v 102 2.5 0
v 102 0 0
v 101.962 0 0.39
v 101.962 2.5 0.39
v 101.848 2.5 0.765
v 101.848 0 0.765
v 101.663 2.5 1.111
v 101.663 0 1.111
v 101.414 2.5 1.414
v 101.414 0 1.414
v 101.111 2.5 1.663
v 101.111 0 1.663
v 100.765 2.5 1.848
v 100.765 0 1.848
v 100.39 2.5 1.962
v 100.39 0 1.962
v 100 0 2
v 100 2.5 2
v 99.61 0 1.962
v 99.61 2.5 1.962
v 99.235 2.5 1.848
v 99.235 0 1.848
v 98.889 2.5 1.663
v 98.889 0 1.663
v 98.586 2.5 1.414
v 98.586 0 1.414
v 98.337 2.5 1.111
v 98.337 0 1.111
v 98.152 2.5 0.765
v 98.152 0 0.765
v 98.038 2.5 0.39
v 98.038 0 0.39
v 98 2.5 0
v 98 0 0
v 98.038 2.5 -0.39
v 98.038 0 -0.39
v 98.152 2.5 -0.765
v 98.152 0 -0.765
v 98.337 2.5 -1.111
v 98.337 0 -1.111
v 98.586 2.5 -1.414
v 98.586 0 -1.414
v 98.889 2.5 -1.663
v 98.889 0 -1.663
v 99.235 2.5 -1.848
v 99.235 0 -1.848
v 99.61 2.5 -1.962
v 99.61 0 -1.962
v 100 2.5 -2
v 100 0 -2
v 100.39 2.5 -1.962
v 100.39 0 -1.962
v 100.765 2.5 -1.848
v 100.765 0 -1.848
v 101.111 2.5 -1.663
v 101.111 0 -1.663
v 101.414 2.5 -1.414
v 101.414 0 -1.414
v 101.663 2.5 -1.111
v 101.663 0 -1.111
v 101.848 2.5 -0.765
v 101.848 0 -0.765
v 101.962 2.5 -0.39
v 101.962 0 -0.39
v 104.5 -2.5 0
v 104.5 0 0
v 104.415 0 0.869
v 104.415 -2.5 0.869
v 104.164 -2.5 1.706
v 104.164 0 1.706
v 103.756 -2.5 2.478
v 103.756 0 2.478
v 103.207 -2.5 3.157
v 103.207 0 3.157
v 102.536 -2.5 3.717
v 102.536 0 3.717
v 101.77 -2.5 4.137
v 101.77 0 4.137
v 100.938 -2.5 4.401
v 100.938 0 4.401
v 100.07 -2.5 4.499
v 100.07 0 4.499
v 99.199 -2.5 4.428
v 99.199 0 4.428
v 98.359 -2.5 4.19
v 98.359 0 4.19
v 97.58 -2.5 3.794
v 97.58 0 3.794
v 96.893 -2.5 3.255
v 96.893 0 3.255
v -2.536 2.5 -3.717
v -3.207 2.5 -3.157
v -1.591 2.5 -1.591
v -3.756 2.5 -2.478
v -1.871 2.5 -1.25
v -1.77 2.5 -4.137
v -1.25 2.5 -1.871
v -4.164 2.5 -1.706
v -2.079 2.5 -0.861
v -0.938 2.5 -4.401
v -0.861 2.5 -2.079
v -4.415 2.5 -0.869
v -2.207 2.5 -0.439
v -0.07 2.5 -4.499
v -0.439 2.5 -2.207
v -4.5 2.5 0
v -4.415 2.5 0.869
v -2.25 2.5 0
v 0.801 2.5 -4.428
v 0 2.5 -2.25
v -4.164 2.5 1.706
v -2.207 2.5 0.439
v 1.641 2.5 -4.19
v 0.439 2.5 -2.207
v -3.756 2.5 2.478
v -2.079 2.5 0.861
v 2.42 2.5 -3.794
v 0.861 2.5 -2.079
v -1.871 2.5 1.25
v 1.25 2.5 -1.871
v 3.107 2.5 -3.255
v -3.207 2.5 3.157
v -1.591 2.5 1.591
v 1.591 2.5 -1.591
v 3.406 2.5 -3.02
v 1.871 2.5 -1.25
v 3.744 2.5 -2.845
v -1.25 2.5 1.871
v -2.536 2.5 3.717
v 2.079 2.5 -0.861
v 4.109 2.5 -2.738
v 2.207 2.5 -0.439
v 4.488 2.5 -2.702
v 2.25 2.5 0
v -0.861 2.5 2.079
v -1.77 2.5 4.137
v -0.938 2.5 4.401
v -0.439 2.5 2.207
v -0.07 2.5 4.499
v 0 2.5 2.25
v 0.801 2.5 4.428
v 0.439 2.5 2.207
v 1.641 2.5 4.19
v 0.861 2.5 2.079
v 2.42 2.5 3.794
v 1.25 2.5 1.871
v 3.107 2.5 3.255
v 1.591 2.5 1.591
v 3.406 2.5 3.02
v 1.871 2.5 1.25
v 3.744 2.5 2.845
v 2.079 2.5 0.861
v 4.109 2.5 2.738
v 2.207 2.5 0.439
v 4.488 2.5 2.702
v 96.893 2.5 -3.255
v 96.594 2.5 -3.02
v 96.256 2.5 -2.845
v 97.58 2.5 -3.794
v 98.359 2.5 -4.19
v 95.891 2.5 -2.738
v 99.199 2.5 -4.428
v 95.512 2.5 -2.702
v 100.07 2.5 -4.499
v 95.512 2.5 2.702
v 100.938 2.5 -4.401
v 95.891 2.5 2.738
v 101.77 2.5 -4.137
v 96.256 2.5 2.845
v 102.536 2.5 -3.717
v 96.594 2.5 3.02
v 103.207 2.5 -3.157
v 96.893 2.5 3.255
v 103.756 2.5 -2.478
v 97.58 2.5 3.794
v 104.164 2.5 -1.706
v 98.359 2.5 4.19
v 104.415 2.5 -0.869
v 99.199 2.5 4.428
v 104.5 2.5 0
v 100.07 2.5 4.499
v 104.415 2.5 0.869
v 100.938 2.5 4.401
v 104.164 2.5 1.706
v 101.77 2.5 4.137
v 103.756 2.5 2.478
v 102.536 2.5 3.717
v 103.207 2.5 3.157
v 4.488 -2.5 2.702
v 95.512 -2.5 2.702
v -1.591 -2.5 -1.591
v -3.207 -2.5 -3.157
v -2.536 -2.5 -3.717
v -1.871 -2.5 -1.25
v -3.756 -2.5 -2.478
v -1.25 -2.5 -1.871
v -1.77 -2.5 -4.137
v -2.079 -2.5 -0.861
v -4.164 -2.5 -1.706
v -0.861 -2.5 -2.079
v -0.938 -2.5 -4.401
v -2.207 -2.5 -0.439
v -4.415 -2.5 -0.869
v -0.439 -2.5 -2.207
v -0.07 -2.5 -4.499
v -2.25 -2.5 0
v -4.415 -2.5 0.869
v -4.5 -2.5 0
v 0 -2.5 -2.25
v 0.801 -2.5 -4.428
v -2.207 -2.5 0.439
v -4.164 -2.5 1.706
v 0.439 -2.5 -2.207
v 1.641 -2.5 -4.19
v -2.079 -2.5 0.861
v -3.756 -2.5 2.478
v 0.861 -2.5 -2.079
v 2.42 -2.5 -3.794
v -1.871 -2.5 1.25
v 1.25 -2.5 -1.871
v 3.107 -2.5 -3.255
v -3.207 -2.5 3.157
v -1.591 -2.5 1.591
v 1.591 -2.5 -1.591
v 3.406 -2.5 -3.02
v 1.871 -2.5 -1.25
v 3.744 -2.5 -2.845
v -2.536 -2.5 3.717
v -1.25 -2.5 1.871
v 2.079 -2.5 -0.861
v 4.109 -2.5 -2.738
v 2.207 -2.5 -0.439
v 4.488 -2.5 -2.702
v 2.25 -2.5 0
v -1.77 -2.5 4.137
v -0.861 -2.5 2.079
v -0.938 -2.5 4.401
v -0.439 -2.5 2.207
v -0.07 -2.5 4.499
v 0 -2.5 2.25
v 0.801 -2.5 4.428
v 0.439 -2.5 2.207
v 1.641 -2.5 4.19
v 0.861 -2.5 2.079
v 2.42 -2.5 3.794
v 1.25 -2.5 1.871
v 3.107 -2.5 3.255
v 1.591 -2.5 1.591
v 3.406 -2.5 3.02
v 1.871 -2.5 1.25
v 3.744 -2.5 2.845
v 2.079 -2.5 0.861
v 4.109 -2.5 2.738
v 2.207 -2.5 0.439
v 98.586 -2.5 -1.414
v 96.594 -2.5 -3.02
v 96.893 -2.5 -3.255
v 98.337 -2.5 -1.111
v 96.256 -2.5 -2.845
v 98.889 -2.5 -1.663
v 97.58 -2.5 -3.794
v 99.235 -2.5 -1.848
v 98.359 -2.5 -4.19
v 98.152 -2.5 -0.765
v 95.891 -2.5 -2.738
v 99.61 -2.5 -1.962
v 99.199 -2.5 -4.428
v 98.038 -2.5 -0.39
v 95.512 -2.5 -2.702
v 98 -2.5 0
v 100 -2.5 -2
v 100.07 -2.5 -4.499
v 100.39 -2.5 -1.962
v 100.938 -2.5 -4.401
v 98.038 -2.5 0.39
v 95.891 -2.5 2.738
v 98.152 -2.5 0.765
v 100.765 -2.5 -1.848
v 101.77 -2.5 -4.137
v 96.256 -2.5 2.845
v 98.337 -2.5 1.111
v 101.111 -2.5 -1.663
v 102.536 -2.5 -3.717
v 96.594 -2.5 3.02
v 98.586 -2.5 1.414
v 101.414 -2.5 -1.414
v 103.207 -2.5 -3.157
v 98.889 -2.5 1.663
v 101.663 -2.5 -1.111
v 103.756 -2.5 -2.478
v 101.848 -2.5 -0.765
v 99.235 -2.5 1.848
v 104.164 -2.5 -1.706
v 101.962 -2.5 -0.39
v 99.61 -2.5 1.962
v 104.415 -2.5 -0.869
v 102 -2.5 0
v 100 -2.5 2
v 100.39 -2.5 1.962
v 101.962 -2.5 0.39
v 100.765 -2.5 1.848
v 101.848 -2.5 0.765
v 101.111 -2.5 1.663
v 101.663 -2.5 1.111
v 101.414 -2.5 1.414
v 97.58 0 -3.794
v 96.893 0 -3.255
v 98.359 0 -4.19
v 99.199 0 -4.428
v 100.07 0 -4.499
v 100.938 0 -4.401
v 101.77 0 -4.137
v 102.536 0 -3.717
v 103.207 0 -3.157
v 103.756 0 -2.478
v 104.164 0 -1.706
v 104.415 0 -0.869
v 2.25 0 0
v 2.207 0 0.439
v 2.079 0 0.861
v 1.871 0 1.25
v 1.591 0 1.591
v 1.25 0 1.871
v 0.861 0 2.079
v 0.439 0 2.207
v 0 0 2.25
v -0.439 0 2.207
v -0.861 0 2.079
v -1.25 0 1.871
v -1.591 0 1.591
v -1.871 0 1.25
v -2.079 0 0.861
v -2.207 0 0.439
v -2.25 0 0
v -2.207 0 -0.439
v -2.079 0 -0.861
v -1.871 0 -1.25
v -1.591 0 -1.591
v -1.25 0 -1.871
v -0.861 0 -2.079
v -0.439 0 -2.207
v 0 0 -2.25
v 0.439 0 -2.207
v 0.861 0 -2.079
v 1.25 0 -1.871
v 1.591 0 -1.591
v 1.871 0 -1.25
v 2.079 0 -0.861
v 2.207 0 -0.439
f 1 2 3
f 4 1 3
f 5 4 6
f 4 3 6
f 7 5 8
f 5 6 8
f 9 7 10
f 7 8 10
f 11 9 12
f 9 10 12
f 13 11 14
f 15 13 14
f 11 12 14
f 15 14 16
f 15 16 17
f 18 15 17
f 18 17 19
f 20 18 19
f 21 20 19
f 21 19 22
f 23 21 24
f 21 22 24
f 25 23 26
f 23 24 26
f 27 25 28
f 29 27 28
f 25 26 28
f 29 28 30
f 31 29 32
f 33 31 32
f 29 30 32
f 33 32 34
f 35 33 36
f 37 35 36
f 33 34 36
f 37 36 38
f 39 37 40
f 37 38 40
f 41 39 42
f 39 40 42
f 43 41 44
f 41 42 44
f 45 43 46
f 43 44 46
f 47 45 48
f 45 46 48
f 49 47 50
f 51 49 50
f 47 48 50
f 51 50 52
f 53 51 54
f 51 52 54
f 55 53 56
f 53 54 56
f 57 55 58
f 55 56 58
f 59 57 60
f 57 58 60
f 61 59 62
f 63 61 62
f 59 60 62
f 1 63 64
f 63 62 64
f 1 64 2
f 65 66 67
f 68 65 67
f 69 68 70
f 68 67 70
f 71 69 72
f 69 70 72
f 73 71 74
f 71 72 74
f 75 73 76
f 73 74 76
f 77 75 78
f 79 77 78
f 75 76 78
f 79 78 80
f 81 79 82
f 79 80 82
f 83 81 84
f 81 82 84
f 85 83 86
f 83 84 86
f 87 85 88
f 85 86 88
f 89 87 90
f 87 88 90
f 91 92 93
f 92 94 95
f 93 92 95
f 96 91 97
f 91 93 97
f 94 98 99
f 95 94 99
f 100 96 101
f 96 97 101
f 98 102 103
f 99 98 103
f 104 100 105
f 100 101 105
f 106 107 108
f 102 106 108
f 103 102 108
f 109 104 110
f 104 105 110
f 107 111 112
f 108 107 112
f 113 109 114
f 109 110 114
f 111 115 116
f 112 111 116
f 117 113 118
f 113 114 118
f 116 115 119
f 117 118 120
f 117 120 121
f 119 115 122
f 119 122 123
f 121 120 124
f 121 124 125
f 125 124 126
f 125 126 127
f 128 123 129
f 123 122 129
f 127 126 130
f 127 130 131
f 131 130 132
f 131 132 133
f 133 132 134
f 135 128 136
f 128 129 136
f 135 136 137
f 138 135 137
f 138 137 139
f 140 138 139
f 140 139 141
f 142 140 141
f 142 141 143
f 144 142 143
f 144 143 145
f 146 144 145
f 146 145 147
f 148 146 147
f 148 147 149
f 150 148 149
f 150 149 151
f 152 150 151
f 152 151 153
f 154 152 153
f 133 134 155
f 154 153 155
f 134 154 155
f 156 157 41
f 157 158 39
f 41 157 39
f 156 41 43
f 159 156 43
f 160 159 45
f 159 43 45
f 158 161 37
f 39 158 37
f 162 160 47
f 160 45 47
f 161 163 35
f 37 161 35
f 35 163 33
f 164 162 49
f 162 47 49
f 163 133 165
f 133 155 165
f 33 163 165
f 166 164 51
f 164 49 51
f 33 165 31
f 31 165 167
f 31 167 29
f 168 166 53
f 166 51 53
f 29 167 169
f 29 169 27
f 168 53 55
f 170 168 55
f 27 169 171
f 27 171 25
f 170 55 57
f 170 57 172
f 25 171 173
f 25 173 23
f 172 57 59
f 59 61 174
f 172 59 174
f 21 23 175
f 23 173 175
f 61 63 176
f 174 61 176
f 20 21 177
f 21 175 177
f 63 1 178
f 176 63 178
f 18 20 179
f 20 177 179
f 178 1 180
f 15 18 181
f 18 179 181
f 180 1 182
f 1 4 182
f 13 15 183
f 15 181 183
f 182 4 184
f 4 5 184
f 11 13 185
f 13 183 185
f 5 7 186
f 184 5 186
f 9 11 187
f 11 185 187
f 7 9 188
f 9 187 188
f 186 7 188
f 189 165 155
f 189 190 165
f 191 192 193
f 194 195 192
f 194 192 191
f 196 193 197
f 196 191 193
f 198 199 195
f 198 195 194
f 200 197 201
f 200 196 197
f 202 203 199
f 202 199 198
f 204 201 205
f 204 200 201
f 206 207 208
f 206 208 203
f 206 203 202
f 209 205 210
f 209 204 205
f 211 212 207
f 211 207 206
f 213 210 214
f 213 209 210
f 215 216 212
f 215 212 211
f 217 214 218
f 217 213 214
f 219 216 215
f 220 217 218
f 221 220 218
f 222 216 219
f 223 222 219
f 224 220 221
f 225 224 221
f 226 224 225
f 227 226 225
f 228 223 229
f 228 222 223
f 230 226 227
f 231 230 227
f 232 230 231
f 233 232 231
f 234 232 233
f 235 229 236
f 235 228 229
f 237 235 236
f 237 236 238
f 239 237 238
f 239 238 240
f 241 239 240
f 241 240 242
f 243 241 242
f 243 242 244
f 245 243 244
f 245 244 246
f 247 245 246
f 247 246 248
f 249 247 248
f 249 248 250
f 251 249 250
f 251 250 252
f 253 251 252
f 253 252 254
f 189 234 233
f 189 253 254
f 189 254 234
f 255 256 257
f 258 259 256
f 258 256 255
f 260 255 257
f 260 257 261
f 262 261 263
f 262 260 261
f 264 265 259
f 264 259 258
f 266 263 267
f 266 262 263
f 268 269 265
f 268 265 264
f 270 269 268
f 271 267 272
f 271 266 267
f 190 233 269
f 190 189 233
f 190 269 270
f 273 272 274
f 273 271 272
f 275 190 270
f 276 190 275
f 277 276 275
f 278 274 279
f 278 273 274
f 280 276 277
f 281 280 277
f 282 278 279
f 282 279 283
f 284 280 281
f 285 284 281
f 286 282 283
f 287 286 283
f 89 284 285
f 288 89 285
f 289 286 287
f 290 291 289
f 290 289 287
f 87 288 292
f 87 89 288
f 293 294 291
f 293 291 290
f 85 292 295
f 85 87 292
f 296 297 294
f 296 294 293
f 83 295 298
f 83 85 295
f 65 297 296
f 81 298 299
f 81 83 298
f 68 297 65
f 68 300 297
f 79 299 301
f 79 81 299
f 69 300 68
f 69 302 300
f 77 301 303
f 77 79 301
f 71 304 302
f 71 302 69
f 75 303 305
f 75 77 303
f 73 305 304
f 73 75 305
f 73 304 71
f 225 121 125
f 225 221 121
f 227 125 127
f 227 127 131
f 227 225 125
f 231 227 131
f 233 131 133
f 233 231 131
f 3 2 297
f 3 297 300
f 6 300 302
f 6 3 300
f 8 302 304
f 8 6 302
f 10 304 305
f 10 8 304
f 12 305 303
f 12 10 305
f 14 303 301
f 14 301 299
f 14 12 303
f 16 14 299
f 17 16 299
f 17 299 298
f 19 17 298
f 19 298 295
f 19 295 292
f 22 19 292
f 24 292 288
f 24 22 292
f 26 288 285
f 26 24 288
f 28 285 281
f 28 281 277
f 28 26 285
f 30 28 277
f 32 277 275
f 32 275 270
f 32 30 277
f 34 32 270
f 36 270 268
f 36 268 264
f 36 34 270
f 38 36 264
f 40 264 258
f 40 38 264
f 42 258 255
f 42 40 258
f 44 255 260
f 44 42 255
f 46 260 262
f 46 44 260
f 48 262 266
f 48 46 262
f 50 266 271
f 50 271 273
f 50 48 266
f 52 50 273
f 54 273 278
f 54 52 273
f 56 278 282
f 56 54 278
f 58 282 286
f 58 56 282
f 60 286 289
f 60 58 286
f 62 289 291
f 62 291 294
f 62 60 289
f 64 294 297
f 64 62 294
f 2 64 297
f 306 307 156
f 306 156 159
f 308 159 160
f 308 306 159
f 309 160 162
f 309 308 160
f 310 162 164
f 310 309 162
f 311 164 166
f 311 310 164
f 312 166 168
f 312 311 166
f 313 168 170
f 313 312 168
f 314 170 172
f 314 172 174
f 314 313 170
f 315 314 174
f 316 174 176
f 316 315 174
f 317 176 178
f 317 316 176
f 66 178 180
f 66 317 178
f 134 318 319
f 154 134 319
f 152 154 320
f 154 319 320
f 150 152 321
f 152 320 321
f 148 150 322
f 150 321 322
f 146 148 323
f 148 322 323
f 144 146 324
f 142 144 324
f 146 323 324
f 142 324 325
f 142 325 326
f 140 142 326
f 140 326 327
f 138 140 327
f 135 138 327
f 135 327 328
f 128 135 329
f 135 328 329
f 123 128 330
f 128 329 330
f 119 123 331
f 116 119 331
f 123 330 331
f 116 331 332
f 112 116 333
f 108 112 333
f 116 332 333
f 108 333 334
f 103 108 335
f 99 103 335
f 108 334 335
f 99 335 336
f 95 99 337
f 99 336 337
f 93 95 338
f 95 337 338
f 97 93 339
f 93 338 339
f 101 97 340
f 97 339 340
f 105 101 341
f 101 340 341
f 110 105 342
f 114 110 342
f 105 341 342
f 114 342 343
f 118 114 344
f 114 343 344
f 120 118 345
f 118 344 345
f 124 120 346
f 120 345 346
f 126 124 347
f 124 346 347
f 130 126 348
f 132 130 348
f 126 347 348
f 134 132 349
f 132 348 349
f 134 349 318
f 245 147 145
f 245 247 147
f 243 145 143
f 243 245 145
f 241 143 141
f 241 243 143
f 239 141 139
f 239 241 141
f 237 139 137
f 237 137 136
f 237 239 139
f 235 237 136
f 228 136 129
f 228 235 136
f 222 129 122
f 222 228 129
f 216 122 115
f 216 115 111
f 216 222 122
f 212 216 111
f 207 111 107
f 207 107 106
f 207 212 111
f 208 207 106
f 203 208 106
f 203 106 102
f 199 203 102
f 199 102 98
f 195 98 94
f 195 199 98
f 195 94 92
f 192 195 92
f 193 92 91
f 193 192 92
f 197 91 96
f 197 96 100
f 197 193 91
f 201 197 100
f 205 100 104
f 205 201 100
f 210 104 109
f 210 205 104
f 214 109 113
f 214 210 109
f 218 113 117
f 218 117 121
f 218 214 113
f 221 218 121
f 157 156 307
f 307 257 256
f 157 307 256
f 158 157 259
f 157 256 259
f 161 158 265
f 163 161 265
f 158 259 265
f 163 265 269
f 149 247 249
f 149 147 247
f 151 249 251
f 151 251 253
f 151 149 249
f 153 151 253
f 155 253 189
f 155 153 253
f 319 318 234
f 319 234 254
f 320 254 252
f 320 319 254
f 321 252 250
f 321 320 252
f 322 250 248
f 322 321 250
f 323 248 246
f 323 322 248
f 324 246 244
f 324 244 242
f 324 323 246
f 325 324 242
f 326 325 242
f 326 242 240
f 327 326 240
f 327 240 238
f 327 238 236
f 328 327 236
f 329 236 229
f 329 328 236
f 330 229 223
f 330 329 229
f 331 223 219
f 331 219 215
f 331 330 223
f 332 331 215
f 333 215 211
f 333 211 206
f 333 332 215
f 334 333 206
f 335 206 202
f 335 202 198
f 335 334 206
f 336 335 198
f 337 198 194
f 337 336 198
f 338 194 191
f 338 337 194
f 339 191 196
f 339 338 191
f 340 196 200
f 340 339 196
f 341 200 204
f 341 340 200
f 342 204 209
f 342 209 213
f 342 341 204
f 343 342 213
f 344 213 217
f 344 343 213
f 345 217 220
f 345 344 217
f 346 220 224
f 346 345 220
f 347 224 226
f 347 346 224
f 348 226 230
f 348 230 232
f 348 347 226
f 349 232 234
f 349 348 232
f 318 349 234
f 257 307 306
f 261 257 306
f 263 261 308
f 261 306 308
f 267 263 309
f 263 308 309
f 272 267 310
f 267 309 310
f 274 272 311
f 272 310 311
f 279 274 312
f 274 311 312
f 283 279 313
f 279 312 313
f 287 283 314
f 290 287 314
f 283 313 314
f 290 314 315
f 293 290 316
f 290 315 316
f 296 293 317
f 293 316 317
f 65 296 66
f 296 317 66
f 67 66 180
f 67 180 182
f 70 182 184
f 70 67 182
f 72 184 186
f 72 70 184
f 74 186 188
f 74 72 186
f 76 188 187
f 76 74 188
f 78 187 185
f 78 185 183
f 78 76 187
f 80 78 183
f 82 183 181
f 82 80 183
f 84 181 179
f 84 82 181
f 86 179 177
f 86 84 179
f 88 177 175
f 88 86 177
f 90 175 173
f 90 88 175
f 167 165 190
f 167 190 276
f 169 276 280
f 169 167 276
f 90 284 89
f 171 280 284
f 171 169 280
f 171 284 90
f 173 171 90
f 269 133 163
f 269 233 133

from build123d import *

# Parameters (mm, degrees)
F0_R     = 2.25
F0_R_2   = 2
F1_DEPTH = 2.5
F2_R     = 2


with BuildPart() as f1:
    # F0 (on Front) → F1 (new body, symmetric)
    with BuildSketch(Plane.XZ):
        with BuildLine():
            ThreePointArc((3.5986671115, -2.7017762714), (4.2687235798, -1.4240782981), (4.5, 0))
            ThreePointArc((4.5, 0), (4.2687235798, 1.4240782981), (3.5986671115, 2.7017762714))
            ThreePointArc((3.5986671115, 2.7017762714), (-4.5, 0), (3.5986671115, -2.7017762714))
        make_face()
        Circle(F0_R, mode=Mode.SUBTRACT)
        with BuildLine():
            ThreePointArc((3.5986671115, 2.7017762714), (4.2687235798, 1.4240782981), (4.5, 0))
            ThreePointArc((4.5, 0), (4.2687235798, -1.4240782981), (3.5986671115, -2.7017762714))
            Line((3.5986671115, -2.7017762714), (96.4013328885, -2.7017762714))
            ThreePointArc((96.4013328885, -2.7017762714), (95.5, 0), (96.4013328885, 2.7017762714))
            Line((96.4013328885, 2.7017762714), (3.5986671115, 2.7017762714))
        make_face()
        with BuildLine():
            ThreePointArc((104.5, 0), (101.4240782981, 4.2687235798), (96.4013328885, 2.7017762714))
            ThreePointArc((96.4013328885, 2.7017762714), (95.5, 0), (96.4013328885, -2.7017762714))
            ThreePointArc((96.4013328885, -2.7017762714), (101.4240782981, -4.2687235798), (104.5, 0))
        make_face()
        with Locations((100, 0)):
            Circle(F0_R_2, mode=Mode.SUBTRACT)
    extrude(amount=F1_DEPTH, both=True)

    # F2
    f2_edges = [f1.edges().sort_by_distance(p)[0] for p in [
        (3.598667, 0, 2.701776),
        (96.401333, 0, 2.701776),
        (3.598667, 0, -2.701776),
        (96.401333, 0, -2.701776),
    ]]
    fillet(f2_edges, radius=F2_R)


solid = f1.part
